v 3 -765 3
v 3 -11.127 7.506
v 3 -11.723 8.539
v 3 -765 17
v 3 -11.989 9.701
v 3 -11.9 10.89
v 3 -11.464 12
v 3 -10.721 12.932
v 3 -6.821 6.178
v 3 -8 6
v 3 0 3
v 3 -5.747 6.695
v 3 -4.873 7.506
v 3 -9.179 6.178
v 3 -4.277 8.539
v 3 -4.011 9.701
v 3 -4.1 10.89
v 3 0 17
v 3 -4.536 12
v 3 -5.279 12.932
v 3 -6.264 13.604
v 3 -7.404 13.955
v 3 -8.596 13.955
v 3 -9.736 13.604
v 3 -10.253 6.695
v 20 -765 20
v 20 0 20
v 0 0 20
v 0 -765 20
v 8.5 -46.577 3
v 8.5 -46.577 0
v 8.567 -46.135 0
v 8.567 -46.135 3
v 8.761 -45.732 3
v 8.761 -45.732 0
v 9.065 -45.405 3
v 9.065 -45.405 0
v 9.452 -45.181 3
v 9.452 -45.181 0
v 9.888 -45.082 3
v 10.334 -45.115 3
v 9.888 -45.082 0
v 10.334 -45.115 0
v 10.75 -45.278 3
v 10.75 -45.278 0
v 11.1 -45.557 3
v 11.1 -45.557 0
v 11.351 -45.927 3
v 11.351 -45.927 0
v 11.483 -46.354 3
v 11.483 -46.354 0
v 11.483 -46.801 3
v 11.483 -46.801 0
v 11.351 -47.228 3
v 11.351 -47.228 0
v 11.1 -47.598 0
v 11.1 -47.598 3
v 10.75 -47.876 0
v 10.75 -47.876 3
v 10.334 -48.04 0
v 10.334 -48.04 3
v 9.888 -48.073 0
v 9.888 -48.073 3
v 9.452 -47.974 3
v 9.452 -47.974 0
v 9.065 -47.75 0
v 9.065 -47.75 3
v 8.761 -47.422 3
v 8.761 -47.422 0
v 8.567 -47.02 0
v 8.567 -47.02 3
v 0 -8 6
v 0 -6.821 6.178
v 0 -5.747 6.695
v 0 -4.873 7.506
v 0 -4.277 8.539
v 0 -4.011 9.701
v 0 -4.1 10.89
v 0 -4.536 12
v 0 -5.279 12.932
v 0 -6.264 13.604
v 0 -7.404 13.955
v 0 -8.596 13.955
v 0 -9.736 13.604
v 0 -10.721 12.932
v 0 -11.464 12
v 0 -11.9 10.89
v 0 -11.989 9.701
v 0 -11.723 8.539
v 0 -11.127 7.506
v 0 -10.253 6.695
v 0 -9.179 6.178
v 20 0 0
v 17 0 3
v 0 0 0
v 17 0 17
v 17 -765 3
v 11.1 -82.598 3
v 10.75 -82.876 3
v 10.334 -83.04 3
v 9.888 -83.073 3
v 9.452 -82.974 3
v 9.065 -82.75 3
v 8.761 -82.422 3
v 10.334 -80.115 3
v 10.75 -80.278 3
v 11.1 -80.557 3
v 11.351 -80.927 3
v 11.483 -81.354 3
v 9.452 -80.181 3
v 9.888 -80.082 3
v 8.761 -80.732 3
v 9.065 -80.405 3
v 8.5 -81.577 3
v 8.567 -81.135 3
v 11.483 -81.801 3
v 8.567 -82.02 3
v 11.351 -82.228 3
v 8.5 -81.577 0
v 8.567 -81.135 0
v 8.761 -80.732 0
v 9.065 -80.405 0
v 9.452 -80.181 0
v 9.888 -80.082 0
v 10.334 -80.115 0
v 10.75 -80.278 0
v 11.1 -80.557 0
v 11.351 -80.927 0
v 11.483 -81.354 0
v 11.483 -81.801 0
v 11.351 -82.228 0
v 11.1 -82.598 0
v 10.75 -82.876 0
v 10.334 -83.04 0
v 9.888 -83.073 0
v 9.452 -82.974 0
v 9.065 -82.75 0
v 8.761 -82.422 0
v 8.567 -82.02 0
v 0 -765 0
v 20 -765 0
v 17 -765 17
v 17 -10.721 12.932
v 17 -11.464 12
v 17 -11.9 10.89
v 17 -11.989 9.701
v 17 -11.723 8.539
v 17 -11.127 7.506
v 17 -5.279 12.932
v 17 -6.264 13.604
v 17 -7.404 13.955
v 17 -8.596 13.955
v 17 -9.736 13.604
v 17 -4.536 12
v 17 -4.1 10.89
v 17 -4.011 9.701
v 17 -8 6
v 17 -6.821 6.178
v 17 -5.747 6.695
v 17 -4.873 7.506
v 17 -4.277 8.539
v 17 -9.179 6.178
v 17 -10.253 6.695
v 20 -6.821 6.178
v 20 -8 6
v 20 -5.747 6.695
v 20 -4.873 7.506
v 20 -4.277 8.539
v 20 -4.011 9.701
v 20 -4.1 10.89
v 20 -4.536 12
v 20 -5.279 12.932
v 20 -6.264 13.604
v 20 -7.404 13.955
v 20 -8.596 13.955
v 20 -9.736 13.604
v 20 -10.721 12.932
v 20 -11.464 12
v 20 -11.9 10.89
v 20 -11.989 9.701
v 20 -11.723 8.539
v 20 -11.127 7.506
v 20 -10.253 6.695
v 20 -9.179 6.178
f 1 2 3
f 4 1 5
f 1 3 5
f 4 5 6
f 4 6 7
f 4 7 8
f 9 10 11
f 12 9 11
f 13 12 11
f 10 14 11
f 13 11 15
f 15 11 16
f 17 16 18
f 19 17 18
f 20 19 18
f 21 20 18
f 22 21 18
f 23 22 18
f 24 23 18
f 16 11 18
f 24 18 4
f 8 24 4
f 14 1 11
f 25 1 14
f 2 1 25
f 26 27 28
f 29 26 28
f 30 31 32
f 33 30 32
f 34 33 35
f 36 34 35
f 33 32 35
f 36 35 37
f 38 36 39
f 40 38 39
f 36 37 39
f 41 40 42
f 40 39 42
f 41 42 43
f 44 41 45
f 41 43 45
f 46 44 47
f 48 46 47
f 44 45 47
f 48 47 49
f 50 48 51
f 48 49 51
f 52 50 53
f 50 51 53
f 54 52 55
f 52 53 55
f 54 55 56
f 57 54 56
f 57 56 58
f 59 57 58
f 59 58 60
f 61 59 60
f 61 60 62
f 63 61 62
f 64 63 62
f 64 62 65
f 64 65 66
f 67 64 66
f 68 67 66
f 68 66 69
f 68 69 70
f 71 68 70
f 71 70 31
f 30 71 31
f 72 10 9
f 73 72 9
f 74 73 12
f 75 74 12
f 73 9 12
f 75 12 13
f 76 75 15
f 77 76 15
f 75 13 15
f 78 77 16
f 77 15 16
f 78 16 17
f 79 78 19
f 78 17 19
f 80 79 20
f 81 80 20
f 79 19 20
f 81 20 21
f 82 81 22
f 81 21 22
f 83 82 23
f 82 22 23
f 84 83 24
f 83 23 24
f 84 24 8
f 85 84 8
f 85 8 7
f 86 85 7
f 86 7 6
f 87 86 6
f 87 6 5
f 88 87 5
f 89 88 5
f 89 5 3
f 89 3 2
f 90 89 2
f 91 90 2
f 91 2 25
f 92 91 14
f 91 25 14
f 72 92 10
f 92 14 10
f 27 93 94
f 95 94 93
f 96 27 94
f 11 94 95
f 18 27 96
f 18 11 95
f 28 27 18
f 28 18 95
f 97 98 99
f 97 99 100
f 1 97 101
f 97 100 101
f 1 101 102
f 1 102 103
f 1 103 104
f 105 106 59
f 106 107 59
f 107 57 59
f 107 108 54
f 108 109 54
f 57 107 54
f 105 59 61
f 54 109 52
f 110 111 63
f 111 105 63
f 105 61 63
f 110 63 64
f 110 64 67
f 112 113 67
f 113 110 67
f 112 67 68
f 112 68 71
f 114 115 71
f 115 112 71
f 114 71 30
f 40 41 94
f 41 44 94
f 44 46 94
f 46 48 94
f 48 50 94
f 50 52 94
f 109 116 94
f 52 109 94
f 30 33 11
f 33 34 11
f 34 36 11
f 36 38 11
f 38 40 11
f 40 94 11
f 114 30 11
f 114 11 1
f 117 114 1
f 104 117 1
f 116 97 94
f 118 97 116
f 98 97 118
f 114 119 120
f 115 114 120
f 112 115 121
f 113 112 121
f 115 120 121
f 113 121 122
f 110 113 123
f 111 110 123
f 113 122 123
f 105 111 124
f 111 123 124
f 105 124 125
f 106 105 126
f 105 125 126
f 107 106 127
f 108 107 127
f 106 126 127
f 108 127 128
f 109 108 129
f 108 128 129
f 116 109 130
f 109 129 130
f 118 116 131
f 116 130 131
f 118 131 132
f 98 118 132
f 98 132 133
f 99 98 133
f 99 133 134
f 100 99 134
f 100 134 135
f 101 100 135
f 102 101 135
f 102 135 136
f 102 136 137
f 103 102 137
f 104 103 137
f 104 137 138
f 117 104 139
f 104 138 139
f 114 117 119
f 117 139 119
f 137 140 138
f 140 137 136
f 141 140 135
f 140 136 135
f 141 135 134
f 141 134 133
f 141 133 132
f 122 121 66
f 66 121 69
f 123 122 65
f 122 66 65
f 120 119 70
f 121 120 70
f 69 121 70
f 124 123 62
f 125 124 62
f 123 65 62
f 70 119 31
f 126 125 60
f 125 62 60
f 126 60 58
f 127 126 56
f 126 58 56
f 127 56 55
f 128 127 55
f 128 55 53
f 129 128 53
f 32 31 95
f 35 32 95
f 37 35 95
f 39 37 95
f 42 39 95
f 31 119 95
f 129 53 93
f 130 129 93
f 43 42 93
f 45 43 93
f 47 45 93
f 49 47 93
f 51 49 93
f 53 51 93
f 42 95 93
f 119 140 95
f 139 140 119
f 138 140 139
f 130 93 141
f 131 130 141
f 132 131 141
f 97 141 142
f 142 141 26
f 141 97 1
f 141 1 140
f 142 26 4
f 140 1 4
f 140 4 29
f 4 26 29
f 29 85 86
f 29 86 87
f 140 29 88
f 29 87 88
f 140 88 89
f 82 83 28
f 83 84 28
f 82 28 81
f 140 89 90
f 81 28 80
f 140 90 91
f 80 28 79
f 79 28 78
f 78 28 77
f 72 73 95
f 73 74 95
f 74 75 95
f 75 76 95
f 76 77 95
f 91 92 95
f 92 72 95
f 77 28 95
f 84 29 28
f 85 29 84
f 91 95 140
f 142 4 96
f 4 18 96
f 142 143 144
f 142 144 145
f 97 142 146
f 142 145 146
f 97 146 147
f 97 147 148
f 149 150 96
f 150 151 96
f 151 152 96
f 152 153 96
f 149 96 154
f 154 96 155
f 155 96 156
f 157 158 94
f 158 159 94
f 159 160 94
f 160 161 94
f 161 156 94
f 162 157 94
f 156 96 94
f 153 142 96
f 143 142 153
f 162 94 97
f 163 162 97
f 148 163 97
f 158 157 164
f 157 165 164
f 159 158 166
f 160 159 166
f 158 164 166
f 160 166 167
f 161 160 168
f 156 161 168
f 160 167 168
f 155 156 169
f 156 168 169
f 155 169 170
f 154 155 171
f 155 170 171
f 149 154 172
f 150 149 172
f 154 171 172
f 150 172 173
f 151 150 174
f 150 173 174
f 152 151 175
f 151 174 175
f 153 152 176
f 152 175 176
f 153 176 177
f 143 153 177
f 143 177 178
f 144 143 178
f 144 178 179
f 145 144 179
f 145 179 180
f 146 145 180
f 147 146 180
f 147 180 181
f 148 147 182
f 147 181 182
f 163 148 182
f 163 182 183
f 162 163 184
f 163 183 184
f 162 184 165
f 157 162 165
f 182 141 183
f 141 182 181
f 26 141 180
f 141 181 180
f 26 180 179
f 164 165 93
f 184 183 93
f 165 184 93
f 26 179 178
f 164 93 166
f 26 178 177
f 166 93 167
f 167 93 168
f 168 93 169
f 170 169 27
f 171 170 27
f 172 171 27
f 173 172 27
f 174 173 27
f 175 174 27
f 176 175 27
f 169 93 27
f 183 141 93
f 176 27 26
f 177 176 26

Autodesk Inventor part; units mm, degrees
ref_plane "YZ Plane" through (0, 0, 0) normal (1, 0, 0) x (0, 1, 0)
ref_plane "XZ Plane" through (0, 0, 0) normal (0, 1, 0) x (-1, 0, 0)
ref_plane "XY Plane" through (0, 0, 0) normal (0, 0, 1) x (1, 0, 0)
sketch "Sketch1" plane through (0, 0, 0) normal (0, 1, 0) x (-1, 0, 0)
  line L0 (0, 0) -> (-20, 0)
  line L1 (-20, 0) -> (-20, 20)
  line L2 (-20, 20) -> (0, 20)
  line L3 (0, 20) -> (0, 0)
  line L4 (-3, 17) -> (-17, 17)
  line L5 (-17, 17) -> (-17, 3)
  line L6 (-17, 3) -> (-3, 3)
  line L7 (-3, 3) -> (-3, 17)
  dimension "d0" = 20
  dimension "d1" = 20
  dimension "d2" = 3
  dimension "d3" = 3
  dimension "d4" = 3
  dimension "d5" = 3
extrude "Extrusion1" add sketch "Sketch1" against normal blind 765
sketch "Sketch2" plane through (20, 0, 20) normal (1, 0, 0) x (0, 0, -1)
  circle A0 centre (10, -8) radius 4
  line L0 (0, 0) -> (20, 0) projected
  point P0 (10, 0)
  dimension "d8" = 8
  dimension "d9" = 8
extrude "Extrusion2" cut sketch "Sketch2" against normal blind 500
sketch "Sketch3" plane through (20, 0, 0) normal (0, 0, -1) x (-1, 0, 0)
  circle A0 centre (10, -46.5774) radius 1.5 projected
  circle A1 centre (10, -81.5774) radius 1.5 projected
  line L0 (23, -91.5774) -> (-3, -91.5774) projected
  line L1 (23, -91.5774) -> (23, -36.5774) projected
  line L2 (-3, -36.5774) -> (23, -36.5774) projected
  line L3 (-3, -91.5774) -> (-3, -36.5774) projected
  point P0 (20, 0)
extrude "Extrusion3" cut sketch "Sketch3" against normal blind 10 contours A0 | A1
properties part number "arm"
